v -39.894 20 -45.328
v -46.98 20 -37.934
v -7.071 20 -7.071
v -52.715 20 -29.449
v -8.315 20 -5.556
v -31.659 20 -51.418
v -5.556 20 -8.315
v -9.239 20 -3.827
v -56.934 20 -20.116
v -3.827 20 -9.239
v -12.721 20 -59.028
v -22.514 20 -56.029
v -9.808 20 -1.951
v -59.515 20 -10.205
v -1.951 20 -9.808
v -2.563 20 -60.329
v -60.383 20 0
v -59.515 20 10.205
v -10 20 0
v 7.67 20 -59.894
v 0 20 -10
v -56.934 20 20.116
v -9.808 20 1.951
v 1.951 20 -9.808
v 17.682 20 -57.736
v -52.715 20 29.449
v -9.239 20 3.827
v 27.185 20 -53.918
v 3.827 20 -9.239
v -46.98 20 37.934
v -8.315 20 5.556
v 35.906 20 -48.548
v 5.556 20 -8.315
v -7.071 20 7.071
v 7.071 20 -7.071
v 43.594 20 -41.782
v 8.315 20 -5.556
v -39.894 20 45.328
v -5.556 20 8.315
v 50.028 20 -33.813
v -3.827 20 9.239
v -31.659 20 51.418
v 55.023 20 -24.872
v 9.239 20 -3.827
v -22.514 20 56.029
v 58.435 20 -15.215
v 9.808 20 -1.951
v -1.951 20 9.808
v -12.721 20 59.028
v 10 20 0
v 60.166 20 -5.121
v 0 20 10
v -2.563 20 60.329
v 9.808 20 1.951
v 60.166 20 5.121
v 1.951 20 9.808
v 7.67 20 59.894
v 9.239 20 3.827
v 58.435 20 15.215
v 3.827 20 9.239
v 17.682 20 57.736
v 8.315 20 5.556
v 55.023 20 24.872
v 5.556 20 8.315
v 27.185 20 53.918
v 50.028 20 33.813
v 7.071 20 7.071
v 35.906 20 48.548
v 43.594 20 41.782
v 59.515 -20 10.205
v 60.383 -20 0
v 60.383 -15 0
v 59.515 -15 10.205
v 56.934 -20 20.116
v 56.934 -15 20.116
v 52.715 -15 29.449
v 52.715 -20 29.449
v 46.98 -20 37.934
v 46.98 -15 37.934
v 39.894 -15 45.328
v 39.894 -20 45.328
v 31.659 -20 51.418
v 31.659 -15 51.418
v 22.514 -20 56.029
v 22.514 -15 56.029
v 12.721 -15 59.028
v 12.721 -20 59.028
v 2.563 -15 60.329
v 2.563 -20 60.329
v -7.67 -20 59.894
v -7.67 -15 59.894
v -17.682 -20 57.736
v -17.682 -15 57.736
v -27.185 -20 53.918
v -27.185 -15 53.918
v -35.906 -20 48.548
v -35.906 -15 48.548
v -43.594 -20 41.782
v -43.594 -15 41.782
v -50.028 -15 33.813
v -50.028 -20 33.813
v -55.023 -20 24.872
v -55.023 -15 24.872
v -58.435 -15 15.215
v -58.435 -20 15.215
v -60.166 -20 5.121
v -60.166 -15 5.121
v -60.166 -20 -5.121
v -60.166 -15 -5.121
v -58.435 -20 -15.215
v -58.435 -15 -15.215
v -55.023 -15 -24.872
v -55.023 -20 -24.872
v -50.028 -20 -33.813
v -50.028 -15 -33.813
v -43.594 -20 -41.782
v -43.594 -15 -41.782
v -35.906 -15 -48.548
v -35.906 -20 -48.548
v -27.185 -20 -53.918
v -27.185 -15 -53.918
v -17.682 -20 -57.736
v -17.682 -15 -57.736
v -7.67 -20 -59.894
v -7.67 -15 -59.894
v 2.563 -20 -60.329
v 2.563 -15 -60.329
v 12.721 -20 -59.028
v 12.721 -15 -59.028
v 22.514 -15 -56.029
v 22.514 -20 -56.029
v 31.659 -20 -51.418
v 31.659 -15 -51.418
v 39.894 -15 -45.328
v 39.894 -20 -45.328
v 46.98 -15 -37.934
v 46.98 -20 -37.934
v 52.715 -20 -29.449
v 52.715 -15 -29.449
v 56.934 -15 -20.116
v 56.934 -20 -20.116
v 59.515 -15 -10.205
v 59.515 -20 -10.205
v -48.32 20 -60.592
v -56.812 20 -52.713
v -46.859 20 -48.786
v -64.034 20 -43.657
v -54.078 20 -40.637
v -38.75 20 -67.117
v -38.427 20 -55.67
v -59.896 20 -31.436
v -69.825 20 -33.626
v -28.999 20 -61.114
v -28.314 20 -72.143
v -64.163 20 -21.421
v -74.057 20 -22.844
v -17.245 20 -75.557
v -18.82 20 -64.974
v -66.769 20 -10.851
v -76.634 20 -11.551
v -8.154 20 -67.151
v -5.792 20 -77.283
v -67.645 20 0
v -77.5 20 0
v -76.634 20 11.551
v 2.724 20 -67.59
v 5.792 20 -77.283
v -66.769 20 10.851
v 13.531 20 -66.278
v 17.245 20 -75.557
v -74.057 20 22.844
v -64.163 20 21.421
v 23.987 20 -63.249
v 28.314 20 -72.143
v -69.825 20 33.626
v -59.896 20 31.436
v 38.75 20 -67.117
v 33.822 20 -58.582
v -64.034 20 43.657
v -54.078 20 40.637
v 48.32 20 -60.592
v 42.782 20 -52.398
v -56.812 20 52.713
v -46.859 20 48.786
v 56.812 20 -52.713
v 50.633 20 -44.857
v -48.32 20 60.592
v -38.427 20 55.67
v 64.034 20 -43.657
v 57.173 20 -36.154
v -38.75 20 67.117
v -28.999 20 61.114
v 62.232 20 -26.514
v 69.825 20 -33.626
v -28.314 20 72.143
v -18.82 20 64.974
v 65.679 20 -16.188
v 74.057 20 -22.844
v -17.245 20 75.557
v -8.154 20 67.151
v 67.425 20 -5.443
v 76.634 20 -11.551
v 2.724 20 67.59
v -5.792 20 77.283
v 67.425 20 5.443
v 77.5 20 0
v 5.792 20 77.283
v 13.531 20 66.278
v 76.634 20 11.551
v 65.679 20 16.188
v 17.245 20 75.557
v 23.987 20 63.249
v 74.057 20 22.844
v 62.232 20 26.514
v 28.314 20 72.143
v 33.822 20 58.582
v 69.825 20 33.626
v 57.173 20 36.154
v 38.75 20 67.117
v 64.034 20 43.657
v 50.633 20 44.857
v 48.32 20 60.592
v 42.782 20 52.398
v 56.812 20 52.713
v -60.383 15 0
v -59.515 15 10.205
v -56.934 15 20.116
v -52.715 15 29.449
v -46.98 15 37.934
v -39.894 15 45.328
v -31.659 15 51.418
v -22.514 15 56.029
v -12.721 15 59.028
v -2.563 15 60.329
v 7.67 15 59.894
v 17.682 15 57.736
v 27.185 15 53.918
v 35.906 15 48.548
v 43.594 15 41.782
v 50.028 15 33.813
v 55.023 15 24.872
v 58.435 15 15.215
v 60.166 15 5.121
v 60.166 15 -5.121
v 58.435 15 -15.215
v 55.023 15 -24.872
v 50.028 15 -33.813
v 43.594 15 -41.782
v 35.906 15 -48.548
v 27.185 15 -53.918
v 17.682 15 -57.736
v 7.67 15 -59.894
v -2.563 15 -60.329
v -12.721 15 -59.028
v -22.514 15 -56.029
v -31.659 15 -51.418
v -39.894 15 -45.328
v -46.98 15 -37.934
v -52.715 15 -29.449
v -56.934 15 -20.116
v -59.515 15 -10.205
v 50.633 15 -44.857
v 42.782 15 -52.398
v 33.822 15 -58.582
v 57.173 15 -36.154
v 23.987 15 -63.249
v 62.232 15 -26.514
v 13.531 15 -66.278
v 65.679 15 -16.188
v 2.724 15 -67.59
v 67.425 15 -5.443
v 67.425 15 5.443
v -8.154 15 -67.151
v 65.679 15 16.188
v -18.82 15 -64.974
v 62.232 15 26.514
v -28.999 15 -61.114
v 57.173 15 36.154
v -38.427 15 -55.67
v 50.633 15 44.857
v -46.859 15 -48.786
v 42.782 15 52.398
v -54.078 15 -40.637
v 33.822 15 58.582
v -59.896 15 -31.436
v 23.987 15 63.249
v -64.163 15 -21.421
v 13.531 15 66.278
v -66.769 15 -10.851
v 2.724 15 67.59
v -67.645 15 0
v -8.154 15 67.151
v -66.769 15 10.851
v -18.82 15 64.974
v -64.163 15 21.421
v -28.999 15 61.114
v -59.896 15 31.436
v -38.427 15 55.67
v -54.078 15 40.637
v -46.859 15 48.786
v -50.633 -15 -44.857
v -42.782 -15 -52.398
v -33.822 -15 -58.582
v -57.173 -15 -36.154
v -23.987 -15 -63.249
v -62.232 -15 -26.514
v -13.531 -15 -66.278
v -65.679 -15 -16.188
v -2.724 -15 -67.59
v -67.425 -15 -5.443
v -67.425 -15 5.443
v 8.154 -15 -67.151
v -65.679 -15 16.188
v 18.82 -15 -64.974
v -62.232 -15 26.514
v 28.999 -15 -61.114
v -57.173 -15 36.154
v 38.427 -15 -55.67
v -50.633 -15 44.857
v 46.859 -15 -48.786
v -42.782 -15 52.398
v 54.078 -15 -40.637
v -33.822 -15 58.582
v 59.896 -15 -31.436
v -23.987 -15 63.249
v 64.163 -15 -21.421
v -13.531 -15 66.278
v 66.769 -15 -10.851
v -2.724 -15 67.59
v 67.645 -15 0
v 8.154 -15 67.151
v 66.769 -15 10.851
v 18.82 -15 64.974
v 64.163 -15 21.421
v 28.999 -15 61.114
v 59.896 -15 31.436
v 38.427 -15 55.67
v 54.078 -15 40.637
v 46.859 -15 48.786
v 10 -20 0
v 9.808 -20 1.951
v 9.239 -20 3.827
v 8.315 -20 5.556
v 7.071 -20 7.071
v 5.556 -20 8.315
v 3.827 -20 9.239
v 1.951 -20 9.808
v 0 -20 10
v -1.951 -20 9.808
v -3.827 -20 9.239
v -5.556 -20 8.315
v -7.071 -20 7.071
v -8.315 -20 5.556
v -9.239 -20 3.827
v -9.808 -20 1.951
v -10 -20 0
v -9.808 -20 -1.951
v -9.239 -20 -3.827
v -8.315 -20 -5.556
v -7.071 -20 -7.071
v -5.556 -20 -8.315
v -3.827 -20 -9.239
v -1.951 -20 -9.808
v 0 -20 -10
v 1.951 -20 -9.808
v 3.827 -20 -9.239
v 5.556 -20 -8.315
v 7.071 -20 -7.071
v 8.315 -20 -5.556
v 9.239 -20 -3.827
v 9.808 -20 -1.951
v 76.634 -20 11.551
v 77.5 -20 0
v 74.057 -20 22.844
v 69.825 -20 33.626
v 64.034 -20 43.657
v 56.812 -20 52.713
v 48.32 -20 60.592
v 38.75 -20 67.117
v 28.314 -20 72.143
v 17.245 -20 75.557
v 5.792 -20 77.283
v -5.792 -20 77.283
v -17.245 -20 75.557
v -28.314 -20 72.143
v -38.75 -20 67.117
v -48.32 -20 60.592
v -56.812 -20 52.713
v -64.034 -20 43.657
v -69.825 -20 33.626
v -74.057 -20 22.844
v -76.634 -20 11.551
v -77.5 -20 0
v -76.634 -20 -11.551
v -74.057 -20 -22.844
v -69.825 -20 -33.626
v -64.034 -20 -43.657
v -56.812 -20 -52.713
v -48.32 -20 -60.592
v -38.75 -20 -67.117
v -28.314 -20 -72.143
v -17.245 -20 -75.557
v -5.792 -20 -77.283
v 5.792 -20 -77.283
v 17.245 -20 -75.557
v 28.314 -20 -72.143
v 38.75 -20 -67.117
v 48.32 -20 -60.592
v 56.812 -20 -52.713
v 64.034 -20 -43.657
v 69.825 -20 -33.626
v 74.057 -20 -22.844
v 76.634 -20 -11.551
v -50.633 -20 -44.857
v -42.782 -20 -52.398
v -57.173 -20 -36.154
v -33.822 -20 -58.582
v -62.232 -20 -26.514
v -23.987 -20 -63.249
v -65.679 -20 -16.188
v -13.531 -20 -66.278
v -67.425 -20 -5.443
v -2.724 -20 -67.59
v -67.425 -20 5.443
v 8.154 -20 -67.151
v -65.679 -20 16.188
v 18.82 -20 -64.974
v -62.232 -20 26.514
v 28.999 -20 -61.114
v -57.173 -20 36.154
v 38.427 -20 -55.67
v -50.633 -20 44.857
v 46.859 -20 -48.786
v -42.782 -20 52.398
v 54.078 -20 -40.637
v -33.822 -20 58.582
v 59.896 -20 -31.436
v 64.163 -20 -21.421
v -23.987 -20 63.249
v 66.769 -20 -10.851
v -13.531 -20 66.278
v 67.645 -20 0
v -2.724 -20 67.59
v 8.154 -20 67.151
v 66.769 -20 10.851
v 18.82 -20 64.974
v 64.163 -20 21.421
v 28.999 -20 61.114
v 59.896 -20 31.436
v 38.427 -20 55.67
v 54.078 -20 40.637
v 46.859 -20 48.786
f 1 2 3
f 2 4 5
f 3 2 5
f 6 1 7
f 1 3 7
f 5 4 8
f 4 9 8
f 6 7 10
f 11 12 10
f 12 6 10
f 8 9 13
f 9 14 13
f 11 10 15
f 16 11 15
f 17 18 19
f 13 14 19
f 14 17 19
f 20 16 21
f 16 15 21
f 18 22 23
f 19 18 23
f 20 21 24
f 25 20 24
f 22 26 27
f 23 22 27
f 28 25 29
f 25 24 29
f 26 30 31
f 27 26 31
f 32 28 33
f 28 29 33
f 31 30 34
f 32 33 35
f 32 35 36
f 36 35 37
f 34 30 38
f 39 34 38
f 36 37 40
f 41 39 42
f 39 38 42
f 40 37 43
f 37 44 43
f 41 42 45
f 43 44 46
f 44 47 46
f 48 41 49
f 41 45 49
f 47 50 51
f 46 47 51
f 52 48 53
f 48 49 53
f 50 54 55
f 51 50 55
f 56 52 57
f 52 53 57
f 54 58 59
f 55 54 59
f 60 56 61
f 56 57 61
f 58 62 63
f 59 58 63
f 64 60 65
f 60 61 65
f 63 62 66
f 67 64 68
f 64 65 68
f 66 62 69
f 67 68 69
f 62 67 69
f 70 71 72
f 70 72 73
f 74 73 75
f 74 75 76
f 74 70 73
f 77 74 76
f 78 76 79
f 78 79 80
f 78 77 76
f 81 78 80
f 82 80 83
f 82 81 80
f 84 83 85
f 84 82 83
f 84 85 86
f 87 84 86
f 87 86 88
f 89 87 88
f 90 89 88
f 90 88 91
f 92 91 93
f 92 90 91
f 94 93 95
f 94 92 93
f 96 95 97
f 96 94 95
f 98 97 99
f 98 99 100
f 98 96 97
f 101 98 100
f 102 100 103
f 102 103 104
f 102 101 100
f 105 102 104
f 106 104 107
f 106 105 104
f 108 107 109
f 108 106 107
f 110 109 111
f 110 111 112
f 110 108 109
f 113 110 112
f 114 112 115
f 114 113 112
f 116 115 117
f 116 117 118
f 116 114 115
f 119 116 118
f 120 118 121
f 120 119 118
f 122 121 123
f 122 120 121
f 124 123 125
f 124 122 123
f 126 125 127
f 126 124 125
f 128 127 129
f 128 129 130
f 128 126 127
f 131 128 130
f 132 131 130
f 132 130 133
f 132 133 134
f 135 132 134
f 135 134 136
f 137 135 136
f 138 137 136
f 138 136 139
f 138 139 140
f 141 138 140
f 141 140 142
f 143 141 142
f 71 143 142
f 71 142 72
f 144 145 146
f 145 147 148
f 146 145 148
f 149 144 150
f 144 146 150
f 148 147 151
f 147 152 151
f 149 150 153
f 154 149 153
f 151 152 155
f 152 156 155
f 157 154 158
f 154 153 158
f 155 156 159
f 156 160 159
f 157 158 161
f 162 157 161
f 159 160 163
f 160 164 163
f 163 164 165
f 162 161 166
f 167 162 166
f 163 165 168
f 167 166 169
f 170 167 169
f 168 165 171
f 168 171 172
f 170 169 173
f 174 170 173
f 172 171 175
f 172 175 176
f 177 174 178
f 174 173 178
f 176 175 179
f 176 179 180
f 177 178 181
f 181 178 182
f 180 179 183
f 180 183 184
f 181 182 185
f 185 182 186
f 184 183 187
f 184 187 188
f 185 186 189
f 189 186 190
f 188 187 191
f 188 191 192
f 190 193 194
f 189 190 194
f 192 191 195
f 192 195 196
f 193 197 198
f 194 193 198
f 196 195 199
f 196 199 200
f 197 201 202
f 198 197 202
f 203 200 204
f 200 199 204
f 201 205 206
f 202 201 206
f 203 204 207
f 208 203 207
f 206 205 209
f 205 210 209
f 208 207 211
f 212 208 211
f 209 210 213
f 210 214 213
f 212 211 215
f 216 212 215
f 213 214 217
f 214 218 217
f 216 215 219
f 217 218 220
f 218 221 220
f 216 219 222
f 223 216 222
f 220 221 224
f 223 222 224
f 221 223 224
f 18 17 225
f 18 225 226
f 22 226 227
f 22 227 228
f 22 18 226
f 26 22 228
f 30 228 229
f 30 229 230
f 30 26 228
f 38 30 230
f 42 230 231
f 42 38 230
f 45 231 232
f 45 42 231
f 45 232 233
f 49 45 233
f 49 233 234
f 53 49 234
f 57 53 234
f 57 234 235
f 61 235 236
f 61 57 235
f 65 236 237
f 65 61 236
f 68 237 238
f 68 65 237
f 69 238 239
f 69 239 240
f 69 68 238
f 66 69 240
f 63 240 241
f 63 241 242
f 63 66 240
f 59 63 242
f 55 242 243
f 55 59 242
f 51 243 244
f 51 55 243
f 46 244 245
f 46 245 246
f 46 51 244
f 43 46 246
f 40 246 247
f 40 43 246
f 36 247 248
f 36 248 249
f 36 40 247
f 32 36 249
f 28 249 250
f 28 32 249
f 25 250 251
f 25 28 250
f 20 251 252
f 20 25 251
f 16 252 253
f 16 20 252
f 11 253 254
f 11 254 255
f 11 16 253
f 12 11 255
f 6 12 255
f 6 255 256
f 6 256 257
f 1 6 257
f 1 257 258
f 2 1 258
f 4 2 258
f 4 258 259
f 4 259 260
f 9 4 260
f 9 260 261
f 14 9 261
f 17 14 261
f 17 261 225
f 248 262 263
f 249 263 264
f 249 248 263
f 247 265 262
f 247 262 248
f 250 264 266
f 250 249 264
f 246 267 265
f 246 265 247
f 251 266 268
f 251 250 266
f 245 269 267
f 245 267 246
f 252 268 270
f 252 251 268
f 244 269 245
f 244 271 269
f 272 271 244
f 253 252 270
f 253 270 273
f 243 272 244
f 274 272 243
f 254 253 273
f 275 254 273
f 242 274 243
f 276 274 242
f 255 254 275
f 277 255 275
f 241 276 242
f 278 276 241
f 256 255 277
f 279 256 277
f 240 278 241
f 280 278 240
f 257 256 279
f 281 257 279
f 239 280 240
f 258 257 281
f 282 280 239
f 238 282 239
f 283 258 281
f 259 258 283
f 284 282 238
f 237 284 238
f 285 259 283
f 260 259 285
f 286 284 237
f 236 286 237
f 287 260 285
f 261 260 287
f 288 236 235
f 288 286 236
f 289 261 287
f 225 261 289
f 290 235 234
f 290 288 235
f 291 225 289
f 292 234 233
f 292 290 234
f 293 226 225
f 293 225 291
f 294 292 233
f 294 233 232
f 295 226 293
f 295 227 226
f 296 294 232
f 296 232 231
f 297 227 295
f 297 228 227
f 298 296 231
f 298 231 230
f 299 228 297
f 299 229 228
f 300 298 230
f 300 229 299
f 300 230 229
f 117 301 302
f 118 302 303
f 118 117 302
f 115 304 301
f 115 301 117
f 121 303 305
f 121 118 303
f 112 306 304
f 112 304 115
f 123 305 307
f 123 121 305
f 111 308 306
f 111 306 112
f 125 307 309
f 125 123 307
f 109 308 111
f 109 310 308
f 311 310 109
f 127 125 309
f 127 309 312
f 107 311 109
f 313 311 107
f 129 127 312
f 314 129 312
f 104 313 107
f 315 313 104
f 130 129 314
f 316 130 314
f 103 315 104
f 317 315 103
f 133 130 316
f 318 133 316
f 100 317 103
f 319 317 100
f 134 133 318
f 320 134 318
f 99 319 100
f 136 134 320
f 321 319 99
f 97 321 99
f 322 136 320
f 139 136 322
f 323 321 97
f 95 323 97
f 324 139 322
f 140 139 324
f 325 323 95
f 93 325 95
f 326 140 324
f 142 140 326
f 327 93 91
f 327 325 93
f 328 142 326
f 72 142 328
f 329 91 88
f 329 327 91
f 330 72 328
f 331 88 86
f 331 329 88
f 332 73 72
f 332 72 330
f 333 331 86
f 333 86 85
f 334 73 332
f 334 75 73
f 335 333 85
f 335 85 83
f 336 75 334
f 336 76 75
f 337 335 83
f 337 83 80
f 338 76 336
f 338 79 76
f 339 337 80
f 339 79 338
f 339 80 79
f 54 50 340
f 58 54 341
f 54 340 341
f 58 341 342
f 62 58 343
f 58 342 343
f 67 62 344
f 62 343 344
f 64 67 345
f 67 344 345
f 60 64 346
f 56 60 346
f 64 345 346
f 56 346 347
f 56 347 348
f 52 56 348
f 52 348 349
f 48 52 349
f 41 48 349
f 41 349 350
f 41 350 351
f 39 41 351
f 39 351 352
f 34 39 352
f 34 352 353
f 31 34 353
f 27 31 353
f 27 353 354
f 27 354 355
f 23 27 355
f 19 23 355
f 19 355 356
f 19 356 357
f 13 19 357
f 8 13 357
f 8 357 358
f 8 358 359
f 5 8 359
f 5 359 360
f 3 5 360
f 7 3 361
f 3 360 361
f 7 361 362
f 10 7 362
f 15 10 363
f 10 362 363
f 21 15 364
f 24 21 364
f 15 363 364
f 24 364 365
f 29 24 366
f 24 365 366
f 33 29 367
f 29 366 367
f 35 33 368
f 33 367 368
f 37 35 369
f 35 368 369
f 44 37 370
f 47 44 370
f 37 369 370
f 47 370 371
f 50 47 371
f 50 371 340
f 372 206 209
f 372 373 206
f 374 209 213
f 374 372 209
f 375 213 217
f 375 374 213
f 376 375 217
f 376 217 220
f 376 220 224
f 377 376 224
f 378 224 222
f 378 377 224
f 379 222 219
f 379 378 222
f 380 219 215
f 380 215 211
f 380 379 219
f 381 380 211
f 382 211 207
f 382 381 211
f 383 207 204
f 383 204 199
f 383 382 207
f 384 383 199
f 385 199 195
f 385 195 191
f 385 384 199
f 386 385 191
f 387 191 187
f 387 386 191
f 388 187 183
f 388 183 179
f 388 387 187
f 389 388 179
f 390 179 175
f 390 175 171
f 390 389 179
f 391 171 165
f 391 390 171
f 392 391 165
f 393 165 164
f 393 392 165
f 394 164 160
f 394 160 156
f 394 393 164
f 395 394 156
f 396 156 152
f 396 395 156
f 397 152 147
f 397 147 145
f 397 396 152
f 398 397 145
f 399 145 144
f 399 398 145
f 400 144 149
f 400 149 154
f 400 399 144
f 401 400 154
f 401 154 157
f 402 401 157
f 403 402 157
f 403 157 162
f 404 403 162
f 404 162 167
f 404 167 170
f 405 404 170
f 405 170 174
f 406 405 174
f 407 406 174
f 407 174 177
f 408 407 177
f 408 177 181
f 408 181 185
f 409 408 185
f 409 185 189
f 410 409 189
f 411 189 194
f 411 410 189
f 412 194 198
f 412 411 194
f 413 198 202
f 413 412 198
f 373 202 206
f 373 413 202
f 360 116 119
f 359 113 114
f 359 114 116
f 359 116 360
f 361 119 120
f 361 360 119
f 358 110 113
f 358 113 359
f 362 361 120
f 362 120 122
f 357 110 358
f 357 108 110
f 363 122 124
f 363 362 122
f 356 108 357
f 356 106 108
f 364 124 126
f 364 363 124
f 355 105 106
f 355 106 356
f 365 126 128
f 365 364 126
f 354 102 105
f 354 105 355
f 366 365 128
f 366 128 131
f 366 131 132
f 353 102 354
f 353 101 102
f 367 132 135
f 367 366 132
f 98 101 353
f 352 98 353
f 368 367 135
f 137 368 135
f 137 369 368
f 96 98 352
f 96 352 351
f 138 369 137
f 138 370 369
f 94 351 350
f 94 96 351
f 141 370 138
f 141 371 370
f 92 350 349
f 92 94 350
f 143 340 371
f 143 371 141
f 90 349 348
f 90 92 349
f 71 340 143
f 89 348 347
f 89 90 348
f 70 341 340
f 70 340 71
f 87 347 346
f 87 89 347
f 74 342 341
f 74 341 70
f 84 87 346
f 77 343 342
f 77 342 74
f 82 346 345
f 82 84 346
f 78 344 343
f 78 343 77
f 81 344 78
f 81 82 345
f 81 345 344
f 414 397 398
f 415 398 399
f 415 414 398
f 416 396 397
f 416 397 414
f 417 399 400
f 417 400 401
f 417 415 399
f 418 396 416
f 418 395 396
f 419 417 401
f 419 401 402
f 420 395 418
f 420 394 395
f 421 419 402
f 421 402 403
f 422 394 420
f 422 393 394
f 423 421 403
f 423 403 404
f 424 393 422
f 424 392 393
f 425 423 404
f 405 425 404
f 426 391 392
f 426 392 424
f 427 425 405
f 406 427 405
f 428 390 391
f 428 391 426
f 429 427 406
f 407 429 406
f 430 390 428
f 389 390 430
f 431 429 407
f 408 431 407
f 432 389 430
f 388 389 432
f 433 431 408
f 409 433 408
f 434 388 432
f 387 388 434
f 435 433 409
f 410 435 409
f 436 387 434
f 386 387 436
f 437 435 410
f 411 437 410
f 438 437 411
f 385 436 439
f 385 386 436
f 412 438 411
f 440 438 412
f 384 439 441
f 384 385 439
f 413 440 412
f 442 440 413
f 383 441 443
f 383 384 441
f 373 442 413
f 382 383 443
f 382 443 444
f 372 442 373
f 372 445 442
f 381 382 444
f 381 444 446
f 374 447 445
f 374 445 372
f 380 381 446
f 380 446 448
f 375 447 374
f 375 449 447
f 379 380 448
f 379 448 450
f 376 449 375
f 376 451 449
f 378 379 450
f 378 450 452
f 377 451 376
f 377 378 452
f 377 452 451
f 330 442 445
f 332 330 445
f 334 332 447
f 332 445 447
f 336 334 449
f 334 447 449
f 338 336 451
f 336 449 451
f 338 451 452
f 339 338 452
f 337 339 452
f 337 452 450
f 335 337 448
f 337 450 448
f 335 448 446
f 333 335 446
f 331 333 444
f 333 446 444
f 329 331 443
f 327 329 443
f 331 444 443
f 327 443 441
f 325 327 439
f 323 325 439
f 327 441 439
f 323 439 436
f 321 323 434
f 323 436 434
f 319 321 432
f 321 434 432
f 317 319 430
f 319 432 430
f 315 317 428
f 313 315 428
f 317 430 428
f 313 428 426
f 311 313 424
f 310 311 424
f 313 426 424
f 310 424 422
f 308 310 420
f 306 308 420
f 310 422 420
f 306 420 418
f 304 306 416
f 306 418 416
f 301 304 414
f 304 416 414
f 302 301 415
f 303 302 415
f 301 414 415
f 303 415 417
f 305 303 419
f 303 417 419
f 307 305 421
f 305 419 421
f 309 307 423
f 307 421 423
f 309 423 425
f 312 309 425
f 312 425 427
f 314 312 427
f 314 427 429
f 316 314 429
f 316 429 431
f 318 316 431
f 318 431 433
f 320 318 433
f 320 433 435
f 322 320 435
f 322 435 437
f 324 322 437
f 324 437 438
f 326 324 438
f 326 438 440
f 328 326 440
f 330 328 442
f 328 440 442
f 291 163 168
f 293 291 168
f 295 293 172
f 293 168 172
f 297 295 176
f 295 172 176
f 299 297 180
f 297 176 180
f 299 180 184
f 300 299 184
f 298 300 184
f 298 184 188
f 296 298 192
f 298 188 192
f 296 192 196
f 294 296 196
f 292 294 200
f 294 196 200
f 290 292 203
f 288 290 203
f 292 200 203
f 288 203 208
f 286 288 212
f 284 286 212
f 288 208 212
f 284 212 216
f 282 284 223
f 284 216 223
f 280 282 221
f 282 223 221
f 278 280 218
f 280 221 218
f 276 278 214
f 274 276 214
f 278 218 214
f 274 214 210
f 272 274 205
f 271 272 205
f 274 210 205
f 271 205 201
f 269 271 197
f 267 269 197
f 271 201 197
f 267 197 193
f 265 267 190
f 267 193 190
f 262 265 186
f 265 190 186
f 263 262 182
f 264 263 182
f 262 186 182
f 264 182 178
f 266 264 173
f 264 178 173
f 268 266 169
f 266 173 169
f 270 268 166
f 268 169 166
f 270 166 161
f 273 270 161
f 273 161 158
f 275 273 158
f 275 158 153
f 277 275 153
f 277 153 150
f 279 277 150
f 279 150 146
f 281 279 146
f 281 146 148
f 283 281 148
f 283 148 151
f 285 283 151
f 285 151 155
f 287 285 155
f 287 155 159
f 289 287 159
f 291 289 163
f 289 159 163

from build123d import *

# Parameters (mm, degrees)
F0_R     = 77.5
F1_DEPTH = 20
F2_R     = 67.6447
F2_R_2   = 60.383238
F3_DEPTH = 5
F4_R     = 67.6447
F4_R_2   = 60.383238
F5_DEPTH = 5
F6_R     = 10
F7_DEPTH = 40.001


with BuildPart() as f1:
    # F0 (on Front) → F1 (new body, symmetric)
    with BuildSketch(Plane.XZ):
        Circle(F0_R)
    extrude(amount=F1_DEPTH, both=True)

    # F2 (on face) → F3 (cut)
    with BuildSketch(Plane(origin=(0, 20, 0), x_dir=(-1, 0, 0), z_dir=(0, 1, 0))):
        Circle(F2_R)
        Circle(F2_R_2, mode=Mode.SUBTRACT)
    extrude(amount=-F3_DEPTH, mode=Mode.SUBTRACT)

    # F4 (on face) → F5 (cut)
    with BuildSketch(Plane.XZ.offset(20)):
        Circle(F4_R)
        Circle(F4_R_2, mode=Mode.SUBTRACT)
    extrude(amount=-F5_DEPTH, mode=Mode.SUBTRACT)

    # F6 (on face) → F7 (cut, through all)
    with BuildSketch(Plane.XZ.offset(20)):
        Circle(F6_R)
    extrude(amount=-F7_DEPTH, mode=Mode.SUBTRACT)


solid = f1.part
